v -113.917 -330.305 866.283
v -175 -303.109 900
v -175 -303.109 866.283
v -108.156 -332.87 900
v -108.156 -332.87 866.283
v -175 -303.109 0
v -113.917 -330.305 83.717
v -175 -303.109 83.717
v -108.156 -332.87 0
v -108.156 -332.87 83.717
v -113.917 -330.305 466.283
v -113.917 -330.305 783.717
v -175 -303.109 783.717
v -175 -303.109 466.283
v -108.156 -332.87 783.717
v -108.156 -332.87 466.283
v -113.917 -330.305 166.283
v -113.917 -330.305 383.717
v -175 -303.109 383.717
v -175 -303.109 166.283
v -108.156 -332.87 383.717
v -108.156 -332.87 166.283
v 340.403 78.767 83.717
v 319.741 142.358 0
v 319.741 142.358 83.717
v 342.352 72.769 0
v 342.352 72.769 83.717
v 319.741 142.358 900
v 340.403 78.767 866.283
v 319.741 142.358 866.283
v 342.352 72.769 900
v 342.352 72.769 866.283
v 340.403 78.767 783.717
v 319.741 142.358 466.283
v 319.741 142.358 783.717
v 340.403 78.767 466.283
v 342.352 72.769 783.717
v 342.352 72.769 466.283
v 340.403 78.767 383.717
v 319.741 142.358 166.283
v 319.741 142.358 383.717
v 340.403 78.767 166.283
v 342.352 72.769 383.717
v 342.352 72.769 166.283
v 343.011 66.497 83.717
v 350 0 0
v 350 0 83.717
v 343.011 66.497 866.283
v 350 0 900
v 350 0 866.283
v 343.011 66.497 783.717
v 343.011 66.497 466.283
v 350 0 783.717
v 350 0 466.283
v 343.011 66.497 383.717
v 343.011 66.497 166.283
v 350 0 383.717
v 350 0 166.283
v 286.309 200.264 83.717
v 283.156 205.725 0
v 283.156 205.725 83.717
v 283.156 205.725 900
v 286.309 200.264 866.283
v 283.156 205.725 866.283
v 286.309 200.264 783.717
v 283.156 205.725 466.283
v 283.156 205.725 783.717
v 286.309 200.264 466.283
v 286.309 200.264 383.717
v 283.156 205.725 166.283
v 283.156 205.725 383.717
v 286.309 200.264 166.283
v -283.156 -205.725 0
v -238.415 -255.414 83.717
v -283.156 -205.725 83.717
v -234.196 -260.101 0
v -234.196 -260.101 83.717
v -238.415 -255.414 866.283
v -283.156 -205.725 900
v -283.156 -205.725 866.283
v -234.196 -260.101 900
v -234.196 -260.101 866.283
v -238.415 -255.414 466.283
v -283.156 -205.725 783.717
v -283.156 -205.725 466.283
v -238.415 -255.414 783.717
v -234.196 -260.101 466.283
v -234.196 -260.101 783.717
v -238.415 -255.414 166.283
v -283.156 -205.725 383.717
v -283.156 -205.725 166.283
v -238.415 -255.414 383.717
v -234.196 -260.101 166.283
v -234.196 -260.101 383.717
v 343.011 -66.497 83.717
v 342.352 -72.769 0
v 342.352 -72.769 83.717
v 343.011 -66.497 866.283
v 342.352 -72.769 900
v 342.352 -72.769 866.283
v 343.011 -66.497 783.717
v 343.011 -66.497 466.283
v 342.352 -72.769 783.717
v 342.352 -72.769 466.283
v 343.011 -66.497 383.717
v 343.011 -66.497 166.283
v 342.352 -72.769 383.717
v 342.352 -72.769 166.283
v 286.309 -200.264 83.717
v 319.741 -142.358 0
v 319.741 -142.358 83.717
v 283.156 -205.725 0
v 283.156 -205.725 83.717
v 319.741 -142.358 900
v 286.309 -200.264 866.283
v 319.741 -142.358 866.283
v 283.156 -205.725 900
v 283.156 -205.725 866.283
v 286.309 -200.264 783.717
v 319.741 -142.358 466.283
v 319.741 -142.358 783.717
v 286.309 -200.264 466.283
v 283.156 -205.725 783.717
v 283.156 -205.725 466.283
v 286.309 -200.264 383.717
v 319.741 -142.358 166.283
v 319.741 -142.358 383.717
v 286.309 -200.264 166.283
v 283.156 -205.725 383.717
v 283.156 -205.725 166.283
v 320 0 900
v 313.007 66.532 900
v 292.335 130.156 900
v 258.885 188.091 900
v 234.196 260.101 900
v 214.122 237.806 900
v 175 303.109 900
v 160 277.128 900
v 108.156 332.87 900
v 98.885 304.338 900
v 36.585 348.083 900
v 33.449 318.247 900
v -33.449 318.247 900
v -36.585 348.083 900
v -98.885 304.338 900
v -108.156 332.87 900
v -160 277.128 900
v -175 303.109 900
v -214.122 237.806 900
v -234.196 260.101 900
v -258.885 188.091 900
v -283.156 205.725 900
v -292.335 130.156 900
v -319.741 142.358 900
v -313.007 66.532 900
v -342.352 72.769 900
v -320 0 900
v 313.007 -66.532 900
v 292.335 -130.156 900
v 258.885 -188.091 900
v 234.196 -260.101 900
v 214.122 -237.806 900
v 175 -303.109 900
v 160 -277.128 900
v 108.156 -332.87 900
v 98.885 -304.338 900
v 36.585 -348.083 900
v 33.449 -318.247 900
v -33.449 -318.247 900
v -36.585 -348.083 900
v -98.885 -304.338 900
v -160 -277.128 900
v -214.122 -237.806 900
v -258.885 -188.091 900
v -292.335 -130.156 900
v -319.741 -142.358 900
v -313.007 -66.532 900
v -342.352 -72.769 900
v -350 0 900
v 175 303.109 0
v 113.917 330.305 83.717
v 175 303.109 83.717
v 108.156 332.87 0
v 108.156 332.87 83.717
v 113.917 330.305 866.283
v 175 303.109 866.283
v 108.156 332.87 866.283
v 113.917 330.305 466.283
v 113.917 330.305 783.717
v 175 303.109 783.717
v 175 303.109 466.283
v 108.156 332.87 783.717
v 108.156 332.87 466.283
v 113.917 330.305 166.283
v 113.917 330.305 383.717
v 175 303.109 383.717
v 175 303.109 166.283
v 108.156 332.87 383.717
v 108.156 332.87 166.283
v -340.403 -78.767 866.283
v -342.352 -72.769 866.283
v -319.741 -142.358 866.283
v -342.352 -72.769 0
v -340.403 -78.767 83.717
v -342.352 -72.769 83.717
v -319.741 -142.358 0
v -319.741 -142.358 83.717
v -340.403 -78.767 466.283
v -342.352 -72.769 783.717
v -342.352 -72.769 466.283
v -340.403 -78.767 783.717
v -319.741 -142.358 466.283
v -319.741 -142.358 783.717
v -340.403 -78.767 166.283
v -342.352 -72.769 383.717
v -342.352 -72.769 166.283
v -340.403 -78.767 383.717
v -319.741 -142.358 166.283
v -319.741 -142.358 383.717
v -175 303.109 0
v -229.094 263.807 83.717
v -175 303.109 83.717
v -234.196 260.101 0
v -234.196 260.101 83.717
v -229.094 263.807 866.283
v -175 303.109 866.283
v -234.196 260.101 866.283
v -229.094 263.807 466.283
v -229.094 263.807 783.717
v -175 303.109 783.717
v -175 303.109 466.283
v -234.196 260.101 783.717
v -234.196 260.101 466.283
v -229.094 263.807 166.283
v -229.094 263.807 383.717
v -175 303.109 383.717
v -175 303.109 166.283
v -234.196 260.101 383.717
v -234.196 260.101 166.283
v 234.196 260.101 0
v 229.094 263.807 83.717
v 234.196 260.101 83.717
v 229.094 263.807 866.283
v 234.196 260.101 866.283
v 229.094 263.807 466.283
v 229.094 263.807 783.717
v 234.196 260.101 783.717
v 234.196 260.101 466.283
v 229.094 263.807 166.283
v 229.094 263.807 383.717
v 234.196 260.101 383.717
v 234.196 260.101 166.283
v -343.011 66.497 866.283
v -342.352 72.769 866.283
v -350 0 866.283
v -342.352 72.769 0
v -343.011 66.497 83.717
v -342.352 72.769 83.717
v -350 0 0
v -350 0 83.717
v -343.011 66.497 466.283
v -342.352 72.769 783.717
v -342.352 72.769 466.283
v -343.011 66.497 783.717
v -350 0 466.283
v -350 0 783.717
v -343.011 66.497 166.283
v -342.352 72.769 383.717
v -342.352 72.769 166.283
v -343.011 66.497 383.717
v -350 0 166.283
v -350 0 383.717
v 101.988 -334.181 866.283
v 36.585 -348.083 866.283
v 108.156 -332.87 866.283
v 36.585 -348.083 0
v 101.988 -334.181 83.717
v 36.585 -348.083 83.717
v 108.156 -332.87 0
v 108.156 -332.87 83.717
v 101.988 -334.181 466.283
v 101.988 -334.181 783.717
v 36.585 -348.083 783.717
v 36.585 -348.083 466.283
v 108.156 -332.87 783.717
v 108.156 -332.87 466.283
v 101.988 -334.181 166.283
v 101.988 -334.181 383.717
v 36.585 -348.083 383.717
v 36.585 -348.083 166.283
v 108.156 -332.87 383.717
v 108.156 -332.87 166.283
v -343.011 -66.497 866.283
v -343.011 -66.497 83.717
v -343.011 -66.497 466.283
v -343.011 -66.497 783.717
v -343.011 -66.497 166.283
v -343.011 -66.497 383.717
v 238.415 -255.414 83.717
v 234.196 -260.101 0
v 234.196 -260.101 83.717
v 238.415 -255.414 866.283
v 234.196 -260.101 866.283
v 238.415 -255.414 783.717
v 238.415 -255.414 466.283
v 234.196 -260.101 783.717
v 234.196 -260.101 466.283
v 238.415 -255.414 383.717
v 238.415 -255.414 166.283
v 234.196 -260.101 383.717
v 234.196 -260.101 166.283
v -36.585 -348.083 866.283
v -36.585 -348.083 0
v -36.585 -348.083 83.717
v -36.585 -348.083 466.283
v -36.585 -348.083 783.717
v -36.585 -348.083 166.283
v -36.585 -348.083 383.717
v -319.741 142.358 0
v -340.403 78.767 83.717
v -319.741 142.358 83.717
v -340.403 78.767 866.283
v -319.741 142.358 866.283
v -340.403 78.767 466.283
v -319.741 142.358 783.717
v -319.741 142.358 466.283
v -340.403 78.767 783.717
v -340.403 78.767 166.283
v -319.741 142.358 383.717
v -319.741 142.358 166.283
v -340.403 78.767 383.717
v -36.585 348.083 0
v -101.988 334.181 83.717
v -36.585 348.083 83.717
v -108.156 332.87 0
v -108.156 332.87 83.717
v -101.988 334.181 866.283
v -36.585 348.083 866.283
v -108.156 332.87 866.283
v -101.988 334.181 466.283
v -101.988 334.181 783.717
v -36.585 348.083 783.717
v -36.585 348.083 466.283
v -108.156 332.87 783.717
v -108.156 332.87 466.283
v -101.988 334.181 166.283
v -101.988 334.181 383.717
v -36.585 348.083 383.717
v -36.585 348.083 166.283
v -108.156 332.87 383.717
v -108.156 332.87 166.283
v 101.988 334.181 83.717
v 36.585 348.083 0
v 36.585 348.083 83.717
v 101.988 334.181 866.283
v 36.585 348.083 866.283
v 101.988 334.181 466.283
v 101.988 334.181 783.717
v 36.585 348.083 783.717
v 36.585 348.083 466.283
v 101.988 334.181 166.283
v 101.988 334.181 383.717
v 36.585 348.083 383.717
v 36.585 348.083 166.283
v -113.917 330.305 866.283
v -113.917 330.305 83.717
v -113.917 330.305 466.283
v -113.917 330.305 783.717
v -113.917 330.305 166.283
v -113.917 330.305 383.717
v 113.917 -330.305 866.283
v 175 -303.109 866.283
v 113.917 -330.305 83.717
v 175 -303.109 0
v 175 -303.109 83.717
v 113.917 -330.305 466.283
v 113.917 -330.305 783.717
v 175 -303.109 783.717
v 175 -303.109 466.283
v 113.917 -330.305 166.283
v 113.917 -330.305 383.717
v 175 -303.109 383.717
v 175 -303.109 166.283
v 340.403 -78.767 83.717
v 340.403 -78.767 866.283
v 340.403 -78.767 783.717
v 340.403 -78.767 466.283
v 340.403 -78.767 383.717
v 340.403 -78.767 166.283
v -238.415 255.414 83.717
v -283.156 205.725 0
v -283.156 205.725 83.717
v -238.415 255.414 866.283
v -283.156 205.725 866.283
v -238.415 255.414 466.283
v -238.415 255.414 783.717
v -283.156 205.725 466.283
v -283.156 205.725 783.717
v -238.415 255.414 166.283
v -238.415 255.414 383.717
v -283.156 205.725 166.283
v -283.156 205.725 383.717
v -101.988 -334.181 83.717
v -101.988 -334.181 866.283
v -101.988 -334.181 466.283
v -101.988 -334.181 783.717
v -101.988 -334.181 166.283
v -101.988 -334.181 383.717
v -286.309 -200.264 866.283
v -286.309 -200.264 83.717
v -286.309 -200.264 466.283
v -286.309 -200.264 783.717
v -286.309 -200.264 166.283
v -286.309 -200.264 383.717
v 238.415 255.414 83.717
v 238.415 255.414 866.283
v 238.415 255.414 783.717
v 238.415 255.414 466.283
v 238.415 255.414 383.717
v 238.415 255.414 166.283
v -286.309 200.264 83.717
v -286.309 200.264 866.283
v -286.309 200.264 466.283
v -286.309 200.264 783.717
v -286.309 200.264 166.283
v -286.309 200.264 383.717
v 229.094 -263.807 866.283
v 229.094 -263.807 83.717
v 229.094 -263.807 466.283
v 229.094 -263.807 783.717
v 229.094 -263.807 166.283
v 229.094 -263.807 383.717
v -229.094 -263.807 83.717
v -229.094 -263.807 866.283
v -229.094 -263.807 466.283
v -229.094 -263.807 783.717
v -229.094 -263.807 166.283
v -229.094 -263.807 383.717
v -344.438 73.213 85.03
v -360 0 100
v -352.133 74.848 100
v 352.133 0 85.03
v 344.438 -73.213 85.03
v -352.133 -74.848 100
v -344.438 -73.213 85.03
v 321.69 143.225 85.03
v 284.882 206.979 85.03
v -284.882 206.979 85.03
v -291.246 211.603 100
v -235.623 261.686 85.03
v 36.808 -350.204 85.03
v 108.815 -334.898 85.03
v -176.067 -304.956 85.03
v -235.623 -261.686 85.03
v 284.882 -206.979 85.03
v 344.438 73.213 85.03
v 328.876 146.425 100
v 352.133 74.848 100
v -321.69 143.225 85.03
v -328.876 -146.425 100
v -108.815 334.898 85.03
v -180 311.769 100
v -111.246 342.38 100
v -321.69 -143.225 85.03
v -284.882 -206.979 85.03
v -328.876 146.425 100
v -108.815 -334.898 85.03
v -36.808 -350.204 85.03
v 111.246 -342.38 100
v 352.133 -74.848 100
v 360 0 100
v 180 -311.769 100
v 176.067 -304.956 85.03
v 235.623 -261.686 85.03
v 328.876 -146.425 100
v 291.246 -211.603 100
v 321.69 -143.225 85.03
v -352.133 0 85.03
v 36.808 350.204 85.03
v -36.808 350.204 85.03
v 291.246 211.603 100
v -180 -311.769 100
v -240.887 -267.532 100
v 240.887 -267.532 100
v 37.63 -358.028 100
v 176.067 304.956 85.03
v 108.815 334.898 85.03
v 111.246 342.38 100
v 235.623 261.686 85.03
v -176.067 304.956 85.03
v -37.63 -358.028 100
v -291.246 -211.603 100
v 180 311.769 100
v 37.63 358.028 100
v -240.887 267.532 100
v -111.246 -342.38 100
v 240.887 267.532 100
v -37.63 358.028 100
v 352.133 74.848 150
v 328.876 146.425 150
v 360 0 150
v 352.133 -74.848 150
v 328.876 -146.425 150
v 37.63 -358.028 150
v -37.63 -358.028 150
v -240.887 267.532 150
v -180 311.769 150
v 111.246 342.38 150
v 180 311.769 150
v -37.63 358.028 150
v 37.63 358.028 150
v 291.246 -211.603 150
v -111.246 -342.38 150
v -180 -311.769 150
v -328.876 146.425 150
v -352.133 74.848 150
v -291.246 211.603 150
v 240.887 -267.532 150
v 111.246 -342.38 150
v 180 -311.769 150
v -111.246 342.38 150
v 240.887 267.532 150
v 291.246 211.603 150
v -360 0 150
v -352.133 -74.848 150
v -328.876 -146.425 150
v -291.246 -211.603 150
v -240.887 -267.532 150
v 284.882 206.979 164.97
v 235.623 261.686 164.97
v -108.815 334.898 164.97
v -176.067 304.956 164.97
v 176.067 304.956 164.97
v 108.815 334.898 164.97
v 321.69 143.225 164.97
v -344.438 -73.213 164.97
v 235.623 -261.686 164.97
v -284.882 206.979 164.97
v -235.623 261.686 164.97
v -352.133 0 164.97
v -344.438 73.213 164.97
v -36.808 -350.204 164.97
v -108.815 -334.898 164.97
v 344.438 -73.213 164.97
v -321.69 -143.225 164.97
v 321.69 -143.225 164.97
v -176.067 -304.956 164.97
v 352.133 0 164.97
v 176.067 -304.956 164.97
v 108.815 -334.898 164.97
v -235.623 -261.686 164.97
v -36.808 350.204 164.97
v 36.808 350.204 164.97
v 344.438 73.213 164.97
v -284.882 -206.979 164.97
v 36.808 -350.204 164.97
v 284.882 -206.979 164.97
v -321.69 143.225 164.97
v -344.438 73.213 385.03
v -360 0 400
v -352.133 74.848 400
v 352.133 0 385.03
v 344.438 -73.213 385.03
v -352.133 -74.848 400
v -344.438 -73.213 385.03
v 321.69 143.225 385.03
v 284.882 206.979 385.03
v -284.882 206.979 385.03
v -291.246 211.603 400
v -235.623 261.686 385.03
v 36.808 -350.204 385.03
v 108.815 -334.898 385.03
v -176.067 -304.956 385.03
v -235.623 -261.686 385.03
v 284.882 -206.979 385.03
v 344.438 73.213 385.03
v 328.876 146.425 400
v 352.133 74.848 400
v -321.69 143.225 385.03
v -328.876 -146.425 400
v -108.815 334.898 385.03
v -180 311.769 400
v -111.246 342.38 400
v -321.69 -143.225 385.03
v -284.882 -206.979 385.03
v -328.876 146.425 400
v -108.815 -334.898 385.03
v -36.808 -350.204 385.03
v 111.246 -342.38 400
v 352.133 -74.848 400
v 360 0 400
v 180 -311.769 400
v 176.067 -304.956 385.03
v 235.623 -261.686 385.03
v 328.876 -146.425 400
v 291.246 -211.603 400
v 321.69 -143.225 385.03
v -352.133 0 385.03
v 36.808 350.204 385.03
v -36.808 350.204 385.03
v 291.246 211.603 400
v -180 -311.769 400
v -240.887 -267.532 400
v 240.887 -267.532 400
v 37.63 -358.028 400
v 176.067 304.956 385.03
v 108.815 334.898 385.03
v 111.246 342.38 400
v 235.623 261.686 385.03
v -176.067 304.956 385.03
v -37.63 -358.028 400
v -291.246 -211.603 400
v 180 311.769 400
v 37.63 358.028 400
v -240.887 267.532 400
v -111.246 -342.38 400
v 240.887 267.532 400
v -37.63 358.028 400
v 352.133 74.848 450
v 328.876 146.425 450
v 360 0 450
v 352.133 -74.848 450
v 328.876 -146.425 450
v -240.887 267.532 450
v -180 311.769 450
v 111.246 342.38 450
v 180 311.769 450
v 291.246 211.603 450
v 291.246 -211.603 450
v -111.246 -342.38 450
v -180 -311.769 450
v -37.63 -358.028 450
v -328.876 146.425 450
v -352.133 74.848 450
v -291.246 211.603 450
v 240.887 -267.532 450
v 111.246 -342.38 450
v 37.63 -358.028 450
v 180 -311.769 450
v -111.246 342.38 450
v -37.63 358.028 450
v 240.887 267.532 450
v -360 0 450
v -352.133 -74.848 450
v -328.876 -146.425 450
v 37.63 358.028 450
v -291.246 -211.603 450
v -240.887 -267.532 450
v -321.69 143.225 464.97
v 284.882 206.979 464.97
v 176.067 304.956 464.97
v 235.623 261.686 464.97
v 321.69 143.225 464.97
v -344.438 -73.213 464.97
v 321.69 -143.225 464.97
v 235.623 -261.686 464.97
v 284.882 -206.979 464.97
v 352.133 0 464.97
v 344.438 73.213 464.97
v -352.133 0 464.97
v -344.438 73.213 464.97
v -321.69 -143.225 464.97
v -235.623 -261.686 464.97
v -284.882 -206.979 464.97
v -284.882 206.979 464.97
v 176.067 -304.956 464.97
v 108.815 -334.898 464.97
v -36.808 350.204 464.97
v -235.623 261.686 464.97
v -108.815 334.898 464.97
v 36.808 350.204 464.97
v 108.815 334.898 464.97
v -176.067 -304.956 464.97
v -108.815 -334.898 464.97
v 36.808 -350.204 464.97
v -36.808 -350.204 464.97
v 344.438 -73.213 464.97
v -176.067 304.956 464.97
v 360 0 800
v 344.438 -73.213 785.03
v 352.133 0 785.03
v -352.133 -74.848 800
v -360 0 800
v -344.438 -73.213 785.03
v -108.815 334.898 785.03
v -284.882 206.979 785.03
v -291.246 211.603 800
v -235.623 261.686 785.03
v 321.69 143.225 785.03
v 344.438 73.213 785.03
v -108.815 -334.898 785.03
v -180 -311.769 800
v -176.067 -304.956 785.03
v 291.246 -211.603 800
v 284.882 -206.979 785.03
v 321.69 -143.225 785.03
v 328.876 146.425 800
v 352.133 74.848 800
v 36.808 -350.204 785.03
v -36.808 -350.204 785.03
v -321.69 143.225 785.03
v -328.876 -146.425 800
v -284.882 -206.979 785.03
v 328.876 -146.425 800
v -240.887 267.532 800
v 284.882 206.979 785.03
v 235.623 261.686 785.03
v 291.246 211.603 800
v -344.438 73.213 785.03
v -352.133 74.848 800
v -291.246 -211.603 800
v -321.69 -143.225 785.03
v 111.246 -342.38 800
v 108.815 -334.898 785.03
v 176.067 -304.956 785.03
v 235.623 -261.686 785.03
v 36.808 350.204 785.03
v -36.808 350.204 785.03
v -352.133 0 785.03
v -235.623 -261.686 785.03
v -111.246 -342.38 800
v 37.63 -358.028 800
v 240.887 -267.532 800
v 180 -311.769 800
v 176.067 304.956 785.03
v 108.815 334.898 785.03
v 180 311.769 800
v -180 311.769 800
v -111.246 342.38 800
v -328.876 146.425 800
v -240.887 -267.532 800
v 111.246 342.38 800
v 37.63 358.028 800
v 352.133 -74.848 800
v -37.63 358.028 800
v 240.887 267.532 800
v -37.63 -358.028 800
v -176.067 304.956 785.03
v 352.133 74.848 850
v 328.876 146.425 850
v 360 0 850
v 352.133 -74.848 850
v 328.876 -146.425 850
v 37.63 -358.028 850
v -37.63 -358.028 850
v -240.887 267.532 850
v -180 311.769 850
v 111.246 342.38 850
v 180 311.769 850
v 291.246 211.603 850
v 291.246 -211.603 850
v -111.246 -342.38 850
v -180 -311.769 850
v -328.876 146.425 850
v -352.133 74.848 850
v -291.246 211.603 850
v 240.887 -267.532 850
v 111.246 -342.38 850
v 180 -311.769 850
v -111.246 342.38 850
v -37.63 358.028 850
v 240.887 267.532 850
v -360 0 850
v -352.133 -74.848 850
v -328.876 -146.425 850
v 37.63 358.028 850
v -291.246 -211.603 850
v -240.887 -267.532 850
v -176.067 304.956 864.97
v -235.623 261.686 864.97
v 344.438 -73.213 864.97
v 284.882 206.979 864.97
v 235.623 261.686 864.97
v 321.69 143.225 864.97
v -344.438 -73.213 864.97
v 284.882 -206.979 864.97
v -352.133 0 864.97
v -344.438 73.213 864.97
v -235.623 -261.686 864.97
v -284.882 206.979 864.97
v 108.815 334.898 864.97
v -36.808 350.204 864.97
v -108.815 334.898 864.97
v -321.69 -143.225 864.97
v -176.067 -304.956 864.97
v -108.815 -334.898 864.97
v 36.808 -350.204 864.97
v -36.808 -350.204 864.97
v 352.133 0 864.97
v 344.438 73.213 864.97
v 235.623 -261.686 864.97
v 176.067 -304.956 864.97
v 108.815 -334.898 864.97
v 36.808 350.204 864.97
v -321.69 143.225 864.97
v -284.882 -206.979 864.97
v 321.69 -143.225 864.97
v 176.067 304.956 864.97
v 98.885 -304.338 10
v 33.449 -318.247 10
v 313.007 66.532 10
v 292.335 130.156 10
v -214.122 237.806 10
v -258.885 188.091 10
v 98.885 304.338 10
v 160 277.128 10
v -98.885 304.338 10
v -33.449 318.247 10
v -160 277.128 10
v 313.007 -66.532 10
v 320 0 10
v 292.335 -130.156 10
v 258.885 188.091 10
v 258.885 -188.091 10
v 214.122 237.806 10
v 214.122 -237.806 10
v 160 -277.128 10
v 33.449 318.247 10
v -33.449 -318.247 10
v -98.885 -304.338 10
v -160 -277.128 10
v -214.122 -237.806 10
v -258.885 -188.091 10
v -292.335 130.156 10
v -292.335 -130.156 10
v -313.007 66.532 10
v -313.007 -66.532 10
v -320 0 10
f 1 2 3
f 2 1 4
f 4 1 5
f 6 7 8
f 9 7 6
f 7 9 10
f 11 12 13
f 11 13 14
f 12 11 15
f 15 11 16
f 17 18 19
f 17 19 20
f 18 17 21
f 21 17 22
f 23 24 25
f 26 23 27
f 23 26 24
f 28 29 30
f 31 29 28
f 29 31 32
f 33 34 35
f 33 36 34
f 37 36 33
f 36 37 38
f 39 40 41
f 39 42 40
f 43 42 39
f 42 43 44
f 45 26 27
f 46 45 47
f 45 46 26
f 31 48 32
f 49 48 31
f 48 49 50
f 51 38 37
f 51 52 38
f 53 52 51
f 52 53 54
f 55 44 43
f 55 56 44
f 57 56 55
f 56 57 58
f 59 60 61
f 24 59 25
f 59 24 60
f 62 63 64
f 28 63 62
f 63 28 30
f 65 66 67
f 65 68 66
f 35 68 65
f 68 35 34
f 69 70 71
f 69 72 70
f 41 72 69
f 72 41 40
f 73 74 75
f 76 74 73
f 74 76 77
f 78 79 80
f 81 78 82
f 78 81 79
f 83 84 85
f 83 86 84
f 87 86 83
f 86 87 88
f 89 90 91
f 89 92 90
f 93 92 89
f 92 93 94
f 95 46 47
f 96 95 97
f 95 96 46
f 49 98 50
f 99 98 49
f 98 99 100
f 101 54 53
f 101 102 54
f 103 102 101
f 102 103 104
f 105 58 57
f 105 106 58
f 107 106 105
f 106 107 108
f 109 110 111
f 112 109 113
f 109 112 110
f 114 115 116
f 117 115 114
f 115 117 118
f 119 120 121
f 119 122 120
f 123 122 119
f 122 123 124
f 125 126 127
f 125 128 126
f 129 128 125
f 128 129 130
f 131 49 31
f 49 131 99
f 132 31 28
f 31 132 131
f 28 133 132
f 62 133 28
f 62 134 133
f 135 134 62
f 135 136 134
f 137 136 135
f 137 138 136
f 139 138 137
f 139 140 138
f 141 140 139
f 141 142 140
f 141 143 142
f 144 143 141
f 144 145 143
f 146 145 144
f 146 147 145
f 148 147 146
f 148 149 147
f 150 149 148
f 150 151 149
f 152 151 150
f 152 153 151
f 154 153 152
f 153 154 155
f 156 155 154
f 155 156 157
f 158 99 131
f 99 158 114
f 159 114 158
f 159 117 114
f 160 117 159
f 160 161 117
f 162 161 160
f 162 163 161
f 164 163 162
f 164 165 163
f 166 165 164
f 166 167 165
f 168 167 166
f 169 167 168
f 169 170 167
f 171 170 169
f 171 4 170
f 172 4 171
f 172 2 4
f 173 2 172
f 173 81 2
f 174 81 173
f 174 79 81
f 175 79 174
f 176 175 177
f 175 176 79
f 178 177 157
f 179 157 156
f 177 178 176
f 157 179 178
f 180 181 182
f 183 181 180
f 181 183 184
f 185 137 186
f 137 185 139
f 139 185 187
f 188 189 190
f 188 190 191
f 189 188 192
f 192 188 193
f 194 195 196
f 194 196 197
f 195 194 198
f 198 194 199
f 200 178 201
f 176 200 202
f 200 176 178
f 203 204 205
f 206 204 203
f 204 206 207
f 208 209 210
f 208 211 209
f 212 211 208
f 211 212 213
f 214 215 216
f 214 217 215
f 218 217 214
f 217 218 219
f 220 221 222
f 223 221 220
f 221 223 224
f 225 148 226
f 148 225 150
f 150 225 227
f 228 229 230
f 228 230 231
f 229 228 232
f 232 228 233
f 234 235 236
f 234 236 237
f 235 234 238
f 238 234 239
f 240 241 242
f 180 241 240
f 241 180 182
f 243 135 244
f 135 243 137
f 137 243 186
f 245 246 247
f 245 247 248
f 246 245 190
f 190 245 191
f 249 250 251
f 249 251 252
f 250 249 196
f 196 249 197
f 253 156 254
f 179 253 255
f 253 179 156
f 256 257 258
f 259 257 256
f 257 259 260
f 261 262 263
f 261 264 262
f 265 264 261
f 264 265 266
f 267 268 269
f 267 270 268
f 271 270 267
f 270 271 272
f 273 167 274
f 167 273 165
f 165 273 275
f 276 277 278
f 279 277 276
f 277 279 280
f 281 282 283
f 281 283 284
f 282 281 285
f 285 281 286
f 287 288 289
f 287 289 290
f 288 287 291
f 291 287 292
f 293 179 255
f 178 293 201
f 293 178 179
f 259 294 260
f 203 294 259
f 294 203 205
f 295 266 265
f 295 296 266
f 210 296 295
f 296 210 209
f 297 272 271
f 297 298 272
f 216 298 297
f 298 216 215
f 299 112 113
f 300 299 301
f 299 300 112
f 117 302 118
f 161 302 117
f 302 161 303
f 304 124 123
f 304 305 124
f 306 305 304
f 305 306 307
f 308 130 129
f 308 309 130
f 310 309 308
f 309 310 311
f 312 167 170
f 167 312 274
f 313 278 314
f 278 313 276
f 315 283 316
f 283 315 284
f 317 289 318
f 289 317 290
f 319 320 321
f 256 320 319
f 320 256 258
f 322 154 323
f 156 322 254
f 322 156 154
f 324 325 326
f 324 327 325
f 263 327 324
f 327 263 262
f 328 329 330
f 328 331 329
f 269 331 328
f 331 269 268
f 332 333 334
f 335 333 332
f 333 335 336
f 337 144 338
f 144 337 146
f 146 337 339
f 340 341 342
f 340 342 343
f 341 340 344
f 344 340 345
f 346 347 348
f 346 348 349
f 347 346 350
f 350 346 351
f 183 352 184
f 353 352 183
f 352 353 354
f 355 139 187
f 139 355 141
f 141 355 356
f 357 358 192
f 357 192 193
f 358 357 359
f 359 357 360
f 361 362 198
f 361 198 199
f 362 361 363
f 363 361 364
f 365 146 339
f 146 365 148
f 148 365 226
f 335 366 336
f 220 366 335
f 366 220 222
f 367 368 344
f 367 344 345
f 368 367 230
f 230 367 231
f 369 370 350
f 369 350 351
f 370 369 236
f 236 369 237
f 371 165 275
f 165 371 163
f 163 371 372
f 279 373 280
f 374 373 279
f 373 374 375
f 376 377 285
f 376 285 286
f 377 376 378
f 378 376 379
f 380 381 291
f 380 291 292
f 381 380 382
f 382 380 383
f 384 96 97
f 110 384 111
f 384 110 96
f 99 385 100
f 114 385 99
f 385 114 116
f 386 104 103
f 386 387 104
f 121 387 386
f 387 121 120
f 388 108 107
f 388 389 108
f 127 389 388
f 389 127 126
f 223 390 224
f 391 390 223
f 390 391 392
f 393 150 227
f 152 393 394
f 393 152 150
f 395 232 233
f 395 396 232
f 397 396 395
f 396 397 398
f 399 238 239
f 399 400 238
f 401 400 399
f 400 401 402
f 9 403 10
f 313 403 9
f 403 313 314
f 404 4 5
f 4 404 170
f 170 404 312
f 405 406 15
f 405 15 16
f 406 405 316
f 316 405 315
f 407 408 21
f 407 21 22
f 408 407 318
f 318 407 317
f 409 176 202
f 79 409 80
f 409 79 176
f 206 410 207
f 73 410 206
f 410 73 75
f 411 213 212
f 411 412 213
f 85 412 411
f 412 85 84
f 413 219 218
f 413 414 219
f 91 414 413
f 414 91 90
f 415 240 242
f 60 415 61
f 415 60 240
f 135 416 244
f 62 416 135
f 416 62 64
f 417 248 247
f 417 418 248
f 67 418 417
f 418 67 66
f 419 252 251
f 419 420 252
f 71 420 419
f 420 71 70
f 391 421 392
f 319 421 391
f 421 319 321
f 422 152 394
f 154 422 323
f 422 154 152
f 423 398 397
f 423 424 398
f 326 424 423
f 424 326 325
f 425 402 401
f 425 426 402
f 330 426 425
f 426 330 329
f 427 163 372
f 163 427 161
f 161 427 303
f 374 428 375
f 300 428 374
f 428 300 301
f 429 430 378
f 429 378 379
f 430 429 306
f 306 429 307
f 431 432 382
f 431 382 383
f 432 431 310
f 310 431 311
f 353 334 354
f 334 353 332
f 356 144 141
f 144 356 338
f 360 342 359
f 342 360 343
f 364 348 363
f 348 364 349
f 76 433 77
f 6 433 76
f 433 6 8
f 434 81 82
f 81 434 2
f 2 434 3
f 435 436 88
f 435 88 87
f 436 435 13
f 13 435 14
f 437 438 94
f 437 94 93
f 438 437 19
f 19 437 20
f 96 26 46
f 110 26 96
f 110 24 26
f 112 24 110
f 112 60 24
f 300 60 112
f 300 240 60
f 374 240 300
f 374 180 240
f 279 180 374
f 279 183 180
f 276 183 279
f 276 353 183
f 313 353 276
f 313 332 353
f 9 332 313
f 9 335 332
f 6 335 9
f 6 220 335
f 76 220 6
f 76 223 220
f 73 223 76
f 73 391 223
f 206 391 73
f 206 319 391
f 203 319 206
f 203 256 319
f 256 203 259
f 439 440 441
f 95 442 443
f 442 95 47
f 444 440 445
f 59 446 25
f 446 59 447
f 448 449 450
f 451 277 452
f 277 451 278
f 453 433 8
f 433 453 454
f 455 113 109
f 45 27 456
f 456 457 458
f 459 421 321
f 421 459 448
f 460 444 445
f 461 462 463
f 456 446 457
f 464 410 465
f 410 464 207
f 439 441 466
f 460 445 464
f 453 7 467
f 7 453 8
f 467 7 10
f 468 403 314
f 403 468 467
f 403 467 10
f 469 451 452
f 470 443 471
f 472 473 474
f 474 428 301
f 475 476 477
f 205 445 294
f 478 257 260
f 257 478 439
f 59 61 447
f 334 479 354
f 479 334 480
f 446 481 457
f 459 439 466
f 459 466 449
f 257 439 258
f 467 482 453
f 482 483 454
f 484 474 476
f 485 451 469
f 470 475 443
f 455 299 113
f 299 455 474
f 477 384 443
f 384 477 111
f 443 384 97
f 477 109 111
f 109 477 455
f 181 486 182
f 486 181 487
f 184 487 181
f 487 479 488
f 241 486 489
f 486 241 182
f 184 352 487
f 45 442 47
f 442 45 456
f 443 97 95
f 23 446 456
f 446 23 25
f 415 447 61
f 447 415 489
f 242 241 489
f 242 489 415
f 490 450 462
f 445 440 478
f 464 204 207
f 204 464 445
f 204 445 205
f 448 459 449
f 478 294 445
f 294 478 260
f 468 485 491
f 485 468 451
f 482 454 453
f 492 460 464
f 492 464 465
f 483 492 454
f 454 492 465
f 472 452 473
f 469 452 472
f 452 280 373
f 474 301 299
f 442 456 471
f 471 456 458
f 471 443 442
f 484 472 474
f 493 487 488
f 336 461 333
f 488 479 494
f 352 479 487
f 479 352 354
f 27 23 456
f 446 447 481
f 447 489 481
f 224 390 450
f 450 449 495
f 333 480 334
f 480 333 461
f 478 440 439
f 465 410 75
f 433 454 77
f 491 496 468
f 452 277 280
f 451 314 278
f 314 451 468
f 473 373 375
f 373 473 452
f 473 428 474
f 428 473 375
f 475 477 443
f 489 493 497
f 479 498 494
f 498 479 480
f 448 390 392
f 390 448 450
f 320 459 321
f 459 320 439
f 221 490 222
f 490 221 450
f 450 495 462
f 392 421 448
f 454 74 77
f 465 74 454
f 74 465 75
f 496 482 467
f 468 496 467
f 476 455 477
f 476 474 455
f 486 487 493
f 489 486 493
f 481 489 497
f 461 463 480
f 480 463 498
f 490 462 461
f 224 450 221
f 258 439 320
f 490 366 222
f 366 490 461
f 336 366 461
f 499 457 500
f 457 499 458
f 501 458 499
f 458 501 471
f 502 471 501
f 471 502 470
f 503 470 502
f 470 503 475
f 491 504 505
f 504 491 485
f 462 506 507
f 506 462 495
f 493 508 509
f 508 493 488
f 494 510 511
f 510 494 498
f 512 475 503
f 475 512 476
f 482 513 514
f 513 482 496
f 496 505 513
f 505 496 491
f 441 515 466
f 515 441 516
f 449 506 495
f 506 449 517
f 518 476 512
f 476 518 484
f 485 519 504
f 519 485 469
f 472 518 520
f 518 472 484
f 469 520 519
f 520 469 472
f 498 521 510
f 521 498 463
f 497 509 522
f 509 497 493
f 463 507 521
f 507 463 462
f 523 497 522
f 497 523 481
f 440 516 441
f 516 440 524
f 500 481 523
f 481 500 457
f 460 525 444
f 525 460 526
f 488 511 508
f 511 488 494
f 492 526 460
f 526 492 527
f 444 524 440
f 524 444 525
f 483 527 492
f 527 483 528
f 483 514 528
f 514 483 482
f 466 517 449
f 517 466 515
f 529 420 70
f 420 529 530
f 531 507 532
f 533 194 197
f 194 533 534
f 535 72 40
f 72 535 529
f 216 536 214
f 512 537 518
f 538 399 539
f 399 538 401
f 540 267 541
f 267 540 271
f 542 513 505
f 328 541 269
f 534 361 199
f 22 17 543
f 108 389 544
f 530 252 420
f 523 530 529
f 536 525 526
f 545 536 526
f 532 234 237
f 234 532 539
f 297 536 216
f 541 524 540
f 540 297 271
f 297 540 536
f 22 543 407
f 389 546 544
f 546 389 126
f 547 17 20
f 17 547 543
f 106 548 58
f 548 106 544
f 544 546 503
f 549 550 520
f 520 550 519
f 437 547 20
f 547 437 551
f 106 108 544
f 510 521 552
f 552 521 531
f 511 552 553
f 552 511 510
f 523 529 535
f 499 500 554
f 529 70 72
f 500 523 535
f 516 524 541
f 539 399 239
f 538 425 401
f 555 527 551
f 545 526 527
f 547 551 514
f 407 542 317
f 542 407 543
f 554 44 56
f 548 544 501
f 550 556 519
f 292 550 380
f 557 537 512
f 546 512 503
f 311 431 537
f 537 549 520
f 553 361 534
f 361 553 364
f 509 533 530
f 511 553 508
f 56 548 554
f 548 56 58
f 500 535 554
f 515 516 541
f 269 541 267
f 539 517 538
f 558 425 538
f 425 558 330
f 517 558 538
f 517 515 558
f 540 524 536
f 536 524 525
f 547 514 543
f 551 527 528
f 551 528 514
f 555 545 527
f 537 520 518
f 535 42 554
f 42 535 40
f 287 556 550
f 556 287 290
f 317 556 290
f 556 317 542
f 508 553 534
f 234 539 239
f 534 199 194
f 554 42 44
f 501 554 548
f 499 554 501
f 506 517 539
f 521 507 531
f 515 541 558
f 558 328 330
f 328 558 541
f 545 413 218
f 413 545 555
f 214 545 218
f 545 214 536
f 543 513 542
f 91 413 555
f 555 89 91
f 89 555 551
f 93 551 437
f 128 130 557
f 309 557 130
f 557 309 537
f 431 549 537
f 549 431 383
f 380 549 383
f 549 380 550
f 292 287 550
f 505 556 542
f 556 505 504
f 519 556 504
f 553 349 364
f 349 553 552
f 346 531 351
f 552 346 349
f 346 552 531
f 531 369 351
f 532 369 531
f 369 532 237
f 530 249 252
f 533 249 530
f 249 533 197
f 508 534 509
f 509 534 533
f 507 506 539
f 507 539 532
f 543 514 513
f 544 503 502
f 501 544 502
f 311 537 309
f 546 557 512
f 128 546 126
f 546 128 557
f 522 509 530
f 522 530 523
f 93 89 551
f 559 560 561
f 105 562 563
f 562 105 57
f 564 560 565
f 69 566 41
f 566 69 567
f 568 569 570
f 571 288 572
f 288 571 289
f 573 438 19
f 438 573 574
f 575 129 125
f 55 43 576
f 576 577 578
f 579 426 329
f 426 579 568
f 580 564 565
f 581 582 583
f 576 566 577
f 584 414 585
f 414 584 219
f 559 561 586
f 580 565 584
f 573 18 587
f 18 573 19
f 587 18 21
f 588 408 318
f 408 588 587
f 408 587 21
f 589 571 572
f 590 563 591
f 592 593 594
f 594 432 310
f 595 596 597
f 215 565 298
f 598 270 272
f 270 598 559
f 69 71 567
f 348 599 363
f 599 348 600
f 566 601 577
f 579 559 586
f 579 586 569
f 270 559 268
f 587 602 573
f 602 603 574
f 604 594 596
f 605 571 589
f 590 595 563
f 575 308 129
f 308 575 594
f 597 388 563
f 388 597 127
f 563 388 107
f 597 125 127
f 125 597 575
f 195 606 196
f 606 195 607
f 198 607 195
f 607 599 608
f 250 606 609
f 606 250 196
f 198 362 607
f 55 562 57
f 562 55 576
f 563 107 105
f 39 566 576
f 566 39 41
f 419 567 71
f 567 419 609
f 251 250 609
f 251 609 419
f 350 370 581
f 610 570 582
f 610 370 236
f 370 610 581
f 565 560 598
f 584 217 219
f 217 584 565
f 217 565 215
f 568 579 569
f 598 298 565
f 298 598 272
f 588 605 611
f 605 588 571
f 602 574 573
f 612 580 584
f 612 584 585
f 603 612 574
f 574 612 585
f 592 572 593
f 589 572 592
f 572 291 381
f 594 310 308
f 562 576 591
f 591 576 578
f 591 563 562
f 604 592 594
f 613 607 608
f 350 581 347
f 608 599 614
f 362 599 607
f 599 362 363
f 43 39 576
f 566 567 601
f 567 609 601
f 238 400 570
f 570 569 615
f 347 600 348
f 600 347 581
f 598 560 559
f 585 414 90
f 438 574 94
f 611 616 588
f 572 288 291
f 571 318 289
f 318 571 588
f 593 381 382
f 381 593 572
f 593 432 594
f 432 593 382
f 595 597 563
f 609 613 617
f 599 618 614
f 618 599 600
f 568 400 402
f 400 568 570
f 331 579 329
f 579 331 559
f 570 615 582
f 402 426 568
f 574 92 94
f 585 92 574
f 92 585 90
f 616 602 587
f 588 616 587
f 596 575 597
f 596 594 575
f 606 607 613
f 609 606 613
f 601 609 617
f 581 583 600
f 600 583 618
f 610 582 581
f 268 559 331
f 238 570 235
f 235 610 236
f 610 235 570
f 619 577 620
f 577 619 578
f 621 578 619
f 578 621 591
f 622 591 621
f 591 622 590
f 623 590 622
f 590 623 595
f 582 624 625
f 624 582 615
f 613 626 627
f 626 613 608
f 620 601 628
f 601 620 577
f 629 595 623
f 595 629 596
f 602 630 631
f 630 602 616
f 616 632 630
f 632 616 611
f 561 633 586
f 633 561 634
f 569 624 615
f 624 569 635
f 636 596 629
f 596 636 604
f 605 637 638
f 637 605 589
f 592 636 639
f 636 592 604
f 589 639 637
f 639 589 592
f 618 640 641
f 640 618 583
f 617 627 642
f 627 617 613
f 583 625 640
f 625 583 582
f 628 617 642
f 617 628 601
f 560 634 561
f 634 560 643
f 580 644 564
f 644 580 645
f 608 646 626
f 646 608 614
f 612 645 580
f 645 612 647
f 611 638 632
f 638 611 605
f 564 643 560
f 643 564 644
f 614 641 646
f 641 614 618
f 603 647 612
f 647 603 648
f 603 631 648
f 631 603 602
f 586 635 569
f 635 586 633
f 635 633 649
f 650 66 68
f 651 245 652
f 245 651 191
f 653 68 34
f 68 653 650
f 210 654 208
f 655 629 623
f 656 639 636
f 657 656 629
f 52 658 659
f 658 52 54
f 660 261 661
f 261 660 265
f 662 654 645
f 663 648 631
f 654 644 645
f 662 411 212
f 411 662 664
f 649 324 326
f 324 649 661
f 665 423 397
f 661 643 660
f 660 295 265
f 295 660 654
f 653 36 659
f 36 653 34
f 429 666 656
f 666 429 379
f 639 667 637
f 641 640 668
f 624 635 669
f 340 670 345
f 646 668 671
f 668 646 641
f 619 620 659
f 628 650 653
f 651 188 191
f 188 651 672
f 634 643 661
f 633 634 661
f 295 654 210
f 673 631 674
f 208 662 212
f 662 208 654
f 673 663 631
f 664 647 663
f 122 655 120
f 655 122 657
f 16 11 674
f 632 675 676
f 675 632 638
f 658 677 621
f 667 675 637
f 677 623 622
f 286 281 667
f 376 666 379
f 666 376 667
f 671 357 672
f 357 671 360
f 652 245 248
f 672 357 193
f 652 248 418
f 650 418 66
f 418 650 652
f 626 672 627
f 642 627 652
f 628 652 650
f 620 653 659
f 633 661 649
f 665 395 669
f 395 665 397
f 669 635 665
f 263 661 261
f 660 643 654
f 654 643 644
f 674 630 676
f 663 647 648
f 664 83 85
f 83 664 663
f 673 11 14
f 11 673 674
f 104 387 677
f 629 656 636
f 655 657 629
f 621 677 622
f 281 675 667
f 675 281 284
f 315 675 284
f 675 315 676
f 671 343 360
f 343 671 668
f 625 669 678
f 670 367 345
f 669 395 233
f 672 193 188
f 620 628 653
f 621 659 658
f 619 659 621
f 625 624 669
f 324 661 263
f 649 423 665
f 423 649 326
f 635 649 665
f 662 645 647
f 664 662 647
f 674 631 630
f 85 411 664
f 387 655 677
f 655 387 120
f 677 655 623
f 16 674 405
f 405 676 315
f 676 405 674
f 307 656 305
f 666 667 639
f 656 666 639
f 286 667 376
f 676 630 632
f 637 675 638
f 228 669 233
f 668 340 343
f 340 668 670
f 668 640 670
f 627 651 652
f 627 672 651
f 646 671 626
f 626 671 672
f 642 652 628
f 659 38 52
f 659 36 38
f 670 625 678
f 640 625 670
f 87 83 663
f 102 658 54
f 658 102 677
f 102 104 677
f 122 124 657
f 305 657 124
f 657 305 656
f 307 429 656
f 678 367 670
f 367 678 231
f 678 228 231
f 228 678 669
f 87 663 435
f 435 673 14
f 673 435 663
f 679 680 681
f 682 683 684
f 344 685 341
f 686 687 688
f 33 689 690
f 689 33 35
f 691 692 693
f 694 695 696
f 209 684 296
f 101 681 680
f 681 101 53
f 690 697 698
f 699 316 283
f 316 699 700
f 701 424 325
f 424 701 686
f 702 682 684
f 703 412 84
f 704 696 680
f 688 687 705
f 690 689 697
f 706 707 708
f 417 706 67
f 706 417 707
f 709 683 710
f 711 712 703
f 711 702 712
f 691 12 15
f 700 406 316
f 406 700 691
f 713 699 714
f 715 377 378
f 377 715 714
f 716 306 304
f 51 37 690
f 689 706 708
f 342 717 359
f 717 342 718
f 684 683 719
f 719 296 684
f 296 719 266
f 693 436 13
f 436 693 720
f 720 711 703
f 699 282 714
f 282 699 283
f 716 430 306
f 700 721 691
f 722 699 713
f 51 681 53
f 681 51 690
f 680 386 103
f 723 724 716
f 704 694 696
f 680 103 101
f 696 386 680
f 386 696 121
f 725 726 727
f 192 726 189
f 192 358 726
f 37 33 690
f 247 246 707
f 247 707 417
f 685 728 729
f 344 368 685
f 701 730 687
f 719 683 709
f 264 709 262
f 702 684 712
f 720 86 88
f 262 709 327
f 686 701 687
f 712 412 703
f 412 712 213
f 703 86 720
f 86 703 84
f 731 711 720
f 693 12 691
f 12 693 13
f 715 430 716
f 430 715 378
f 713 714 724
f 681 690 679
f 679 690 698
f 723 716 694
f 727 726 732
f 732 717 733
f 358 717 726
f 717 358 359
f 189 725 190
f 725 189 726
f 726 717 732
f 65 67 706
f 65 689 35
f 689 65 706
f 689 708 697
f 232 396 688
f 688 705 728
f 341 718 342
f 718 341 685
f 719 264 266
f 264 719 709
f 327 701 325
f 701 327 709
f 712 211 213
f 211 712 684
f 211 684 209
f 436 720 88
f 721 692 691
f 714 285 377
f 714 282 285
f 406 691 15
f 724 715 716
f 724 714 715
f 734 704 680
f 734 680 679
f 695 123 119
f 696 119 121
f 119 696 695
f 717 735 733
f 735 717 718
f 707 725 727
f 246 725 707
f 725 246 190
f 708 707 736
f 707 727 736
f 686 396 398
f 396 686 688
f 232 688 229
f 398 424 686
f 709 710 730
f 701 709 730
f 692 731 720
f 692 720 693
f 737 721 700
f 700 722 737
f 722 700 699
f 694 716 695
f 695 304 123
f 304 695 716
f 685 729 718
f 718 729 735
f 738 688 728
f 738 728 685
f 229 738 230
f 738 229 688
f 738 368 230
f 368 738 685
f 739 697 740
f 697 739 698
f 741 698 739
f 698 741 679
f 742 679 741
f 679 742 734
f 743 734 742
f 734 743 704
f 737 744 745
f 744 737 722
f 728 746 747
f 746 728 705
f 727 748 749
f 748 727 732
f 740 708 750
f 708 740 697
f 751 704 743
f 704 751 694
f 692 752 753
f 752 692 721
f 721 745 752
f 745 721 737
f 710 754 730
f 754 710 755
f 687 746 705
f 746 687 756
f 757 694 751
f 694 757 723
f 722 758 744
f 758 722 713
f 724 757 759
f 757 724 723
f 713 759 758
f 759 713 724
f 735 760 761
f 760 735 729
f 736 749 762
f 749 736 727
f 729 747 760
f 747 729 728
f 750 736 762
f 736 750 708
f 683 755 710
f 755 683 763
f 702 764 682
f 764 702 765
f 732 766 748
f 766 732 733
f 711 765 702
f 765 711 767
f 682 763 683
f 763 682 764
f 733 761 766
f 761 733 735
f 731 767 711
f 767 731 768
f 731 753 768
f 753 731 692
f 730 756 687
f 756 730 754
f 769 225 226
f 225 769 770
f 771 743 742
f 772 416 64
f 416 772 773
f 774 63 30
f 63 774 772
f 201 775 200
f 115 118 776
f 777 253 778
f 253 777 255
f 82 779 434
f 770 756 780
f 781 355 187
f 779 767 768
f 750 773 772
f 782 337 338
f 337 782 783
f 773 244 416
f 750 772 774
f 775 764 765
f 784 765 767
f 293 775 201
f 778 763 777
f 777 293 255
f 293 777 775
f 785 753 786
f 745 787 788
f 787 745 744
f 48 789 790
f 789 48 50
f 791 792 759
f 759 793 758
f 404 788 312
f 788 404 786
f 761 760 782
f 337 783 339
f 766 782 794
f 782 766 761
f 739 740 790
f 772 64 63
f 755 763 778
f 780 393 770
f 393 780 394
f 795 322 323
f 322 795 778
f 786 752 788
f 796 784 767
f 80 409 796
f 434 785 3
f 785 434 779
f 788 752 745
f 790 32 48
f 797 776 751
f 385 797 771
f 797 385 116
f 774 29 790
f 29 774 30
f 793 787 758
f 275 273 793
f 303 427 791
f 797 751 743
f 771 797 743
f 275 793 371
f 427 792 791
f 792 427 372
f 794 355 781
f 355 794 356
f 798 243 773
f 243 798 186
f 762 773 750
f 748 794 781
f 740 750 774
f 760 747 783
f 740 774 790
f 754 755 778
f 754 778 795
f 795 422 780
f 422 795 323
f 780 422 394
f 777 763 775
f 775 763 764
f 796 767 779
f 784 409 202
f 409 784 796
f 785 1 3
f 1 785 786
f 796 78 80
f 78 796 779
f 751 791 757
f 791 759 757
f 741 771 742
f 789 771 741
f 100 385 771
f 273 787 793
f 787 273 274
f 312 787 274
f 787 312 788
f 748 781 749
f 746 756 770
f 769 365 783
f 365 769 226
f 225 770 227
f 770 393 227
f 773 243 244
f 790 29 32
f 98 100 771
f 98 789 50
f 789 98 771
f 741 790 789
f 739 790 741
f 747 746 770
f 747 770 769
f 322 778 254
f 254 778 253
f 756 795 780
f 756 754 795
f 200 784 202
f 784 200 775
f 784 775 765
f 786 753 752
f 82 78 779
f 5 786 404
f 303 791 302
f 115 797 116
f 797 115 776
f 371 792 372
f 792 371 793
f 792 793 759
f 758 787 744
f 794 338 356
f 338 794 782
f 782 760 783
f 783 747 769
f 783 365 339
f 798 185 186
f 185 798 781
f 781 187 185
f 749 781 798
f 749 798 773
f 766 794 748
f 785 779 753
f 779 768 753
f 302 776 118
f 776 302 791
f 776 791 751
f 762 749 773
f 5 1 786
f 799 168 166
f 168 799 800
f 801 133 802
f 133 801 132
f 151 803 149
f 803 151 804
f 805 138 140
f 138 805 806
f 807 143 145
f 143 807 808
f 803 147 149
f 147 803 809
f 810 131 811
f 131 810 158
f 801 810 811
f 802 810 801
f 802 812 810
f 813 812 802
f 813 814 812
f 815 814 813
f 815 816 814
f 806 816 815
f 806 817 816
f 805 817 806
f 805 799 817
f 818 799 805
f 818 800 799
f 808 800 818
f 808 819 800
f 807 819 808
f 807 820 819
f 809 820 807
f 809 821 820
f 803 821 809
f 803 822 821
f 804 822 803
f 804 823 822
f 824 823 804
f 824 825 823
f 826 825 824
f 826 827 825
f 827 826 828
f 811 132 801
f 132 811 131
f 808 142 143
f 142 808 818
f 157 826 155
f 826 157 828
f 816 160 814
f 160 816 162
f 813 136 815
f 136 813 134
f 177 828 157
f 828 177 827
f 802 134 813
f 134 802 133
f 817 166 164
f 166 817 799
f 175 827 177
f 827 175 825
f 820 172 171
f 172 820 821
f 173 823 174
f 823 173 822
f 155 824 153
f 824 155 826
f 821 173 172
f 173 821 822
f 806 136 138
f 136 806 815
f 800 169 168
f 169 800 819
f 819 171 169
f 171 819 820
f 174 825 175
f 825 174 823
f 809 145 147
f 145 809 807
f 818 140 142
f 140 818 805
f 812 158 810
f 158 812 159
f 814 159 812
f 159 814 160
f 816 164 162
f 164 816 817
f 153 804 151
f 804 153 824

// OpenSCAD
a=30;


module un(){
cylinder(900,350,350,$fn=a);
translate([0,0,100])scale([1,1,0.2])sphere(360);
translate([0,0,100])cylinder(50,360,360,$fn=a);
translate([0,0,150])scale([1,1,0.2])sphere(360);

translate([0,0,400])scale([1,1,0.2])sphere(360);
translate([0,0,400])cylinder(50,360,360,$fn=a);
translate([0,0,450])scale([1,1,0.2])sphere(360);

translate([0,0,800])scale([1,1,0.2])sphere(360);
translate([0,0,800])cylinder(50,360,360,$fn=a);
translate([0,0,850])scale([1,1,0.2])sphere(360);
}

difference(){
    un();
    
    translate([0,0,10])cylinder(950,320,320,$fn=a);
}
